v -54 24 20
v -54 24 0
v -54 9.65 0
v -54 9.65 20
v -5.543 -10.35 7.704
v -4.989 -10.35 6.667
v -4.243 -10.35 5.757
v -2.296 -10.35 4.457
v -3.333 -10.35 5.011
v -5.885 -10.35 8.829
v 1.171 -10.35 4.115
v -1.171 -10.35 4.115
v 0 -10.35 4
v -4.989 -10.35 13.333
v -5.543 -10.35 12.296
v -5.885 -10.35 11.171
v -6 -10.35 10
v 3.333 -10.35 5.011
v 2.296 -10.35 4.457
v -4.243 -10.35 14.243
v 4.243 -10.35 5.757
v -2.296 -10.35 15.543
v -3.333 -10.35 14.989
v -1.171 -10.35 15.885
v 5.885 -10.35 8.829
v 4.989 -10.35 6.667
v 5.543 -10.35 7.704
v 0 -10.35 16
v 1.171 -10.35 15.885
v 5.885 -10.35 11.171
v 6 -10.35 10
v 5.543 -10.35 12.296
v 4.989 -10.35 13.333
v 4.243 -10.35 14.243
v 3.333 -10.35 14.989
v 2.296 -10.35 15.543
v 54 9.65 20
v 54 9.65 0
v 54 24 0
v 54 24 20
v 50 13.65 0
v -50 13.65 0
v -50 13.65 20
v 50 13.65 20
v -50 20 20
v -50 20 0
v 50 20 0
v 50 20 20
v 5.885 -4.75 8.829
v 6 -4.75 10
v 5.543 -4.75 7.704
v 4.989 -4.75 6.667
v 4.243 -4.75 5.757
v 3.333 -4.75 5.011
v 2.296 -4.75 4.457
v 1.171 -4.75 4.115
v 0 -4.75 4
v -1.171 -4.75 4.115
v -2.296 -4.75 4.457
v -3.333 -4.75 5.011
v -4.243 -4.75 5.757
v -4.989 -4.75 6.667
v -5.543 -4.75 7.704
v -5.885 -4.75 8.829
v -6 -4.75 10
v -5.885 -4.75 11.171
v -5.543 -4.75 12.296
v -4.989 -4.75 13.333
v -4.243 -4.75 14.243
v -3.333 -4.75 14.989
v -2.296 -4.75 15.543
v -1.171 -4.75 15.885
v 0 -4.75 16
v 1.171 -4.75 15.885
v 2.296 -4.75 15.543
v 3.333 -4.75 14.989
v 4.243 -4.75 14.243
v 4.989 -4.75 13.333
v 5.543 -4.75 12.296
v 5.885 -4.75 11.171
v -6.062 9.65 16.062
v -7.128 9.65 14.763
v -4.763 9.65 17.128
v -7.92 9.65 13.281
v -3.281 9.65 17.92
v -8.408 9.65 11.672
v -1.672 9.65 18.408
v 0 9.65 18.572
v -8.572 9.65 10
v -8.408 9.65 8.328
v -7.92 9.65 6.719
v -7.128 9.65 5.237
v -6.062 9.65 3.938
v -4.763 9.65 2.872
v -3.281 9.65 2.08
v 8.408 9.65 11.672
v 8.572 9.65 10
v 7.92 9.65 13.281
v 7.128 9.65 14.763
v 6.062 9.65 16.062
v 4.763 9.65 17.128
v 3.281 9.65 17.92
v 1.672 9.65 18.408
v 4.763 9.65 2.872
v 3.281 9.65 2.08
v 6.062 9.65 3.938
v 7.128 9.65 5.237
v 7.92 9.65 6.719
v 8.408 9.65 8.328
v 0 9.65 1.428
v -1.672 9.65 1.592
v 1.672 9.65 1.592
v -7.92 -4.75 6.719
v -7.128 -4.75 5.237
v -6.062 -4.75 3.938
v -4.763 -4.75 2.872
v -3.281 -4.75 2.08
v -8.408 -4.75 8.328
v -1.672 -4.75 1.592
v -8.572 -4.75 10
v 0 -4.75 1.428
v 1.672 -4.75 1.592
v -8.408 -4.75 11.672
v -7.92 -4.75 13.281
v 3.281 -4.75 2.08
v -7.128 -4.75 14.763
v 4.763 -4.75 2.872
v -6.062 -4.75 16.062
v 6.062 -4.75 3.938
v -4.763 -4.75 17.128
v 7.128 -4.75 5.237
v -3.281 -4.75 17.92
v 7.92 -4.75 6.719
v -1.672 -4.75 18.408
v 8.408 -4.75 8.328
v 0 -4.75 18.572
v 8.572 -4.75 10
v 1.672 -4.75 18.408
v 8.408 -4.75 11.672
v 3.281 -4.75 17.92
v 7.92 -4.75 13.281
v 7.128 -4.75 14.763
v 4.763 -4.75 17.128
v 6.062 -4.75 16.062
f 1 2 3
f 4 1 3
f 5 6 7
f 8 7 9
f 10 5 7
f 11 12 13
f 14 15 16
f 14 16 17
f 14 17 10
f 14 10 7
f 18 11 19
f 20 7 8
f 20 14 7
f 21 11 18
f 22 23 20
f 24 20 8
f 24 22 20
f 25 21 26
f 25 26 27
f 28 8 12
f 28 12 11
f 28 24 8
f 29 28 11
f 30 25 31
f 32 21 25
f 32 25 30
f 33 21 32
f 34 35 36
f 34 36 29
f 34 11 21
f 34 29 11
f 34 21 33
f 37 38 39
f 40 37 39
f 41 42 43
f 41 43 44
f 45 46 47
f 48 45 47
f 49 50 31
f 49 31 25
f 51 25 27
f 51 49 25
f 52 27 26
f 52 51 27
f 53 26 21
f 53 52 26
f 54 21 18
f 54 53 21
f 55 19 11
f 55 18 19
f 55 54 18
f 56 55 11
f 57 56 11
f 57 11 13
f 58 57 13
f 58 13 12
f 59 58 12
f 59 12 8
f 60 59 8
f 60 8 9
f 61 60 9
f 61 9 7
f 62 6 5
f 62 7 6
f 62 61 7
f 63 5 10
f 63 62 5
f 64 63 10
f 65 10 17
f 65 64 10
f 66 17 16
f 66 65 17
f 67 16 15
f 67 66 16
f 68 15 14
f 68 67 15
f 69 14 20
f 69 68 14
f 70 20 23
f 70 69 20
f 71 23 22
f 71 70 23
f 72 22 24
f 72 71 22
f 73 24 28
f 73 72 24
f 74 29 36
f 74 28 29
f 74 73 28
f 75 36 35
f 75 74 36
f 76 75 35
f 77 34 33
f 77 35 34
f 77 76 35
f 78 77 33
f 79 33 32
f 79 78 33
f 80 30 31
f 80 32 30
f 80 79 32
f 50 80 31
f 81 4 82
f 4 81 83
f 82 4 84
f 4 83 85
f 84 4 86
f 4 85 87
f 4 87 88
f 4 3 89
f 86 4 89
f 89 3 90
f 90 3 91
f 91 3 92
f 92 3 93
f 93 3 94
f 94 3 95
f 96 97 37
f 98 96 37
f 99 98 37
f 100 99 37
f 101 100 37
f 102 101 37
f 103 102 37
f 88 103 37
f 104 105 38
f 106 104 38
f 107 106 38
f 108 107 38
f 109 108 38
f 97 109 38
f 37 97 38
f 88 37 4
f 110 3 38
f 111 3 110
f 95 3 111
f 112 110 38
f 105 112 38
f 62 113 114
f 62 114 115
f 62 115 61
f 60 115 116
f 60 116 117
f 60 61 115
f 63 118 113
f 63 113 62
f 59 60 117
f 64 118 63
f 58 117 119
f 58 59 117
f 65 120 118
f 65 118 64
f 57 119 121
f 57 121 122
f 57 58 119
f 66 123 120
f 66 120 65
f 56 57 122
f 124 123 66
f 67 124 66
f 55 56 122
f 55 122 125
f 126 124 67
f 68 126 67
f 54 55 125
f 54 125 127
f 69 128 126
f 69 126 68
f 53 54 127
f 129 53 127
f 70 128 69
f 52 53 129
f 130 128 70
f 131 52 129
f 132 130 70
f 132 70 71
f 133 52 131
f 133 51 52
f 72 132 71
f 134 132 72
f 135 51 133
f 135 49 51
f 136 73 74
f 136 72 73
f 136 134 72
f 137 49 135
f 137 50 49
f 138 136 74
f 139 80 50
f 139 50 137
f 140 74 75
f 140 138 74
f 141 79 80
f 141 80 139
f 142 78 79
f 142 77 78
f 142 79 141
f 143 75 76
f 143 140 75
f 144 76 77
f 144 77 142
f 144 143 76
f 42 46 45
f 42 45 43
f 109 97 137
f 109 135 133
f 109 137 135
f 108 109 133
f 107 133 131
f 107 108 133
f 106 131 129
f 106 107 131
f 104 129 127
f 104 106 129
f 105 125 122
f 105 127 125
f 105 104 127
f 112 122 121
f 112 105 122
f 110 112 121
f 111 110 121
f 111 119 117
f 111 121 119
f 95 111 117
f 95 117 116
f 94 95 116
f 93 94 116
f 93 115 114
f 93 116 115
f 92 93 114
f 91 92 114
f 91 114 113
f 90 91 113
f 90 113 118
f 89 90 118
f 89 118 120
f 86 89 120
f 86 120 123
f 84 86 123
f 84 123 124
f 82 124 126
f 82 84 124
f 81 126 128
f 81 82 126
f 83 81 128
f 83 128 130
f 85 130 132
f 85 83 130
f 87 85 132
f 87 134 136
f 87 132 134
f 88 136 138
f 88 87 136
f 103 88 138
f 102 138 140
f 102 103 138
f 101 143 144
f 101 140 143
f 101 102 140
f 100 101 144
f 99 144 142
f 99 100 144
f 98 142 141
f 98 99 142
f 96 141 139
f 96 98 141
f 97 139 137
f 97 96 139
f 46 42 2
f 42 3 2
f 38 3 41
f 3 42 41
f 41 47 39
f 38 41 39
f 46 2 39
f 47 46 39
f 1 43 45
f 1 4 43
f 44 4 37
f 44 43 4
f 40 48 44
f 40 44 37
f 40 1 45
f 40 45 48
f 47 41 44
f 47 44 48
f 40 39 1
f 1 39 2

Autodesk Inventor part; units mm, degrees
ref_plane "YZ Plane" through (0, 0, 0) normal (1, 0, 0) x (0, 1, 0)
ref_plane "XZ Plane" through (0, 0, 0) normal (0, 1, 0) x (-1, 0, 0)
ref_plane "XY Plane" through (0, 0, 0) normal (0, 0, 1) x (1, 0, 0)
sketch "Sketch1" plane through (0, 0, 0) normal (0, 0, 1) x (1, 0, 0)
  line L0 (-50, 20) -> (50, 20)
  line L1 (-50, 20) -> (-50, 13.65)
  line L2 (-50, 13.65) -> (50, 13.65)
  line L3 (50, 13.65) -> (50, 20)
  line L4 (54, 24) -> (-54, 24)
  line L5 (-54, 24) -> (-54, 9.65)
  line L6 (-54, 9.65) -> (54, 9.65)
  line L7 (54, 9.65) -> (54, 24)
  point P0 (0, 0)
  dimension "d0" = 100
  dimension "d1" = 6.35
  dimension "d2" = 4
extrude "Extrusion1" add sketch "Sketch1" along normal blind 20
sketch "Sketch2" plane through (-54, 9.65, 0) normal (0, -1, 0) x (1, 0, 0)
  circle A0 centre (54, 10) radius 6
  point P0 (54, 0)
  dimension "d5" = 12
extrude "Extrusion2" add sketch "Sketch2" along normal blind 20
sketch "Sketch3" plane through (-54, 9.65, 0) normal (0, -1, 0) x (1, 0, 0)
  circle A0 centre (54, 10) radius 6 projected
  circle A1 centre (54, 10) radius 8.5725
  point P0 (54, 0)
  dimension "d8" = 17.145
extrude "Extrusion3" add sketch "Sketch3" along normal blind 14.4
properties part number "Bracket"
